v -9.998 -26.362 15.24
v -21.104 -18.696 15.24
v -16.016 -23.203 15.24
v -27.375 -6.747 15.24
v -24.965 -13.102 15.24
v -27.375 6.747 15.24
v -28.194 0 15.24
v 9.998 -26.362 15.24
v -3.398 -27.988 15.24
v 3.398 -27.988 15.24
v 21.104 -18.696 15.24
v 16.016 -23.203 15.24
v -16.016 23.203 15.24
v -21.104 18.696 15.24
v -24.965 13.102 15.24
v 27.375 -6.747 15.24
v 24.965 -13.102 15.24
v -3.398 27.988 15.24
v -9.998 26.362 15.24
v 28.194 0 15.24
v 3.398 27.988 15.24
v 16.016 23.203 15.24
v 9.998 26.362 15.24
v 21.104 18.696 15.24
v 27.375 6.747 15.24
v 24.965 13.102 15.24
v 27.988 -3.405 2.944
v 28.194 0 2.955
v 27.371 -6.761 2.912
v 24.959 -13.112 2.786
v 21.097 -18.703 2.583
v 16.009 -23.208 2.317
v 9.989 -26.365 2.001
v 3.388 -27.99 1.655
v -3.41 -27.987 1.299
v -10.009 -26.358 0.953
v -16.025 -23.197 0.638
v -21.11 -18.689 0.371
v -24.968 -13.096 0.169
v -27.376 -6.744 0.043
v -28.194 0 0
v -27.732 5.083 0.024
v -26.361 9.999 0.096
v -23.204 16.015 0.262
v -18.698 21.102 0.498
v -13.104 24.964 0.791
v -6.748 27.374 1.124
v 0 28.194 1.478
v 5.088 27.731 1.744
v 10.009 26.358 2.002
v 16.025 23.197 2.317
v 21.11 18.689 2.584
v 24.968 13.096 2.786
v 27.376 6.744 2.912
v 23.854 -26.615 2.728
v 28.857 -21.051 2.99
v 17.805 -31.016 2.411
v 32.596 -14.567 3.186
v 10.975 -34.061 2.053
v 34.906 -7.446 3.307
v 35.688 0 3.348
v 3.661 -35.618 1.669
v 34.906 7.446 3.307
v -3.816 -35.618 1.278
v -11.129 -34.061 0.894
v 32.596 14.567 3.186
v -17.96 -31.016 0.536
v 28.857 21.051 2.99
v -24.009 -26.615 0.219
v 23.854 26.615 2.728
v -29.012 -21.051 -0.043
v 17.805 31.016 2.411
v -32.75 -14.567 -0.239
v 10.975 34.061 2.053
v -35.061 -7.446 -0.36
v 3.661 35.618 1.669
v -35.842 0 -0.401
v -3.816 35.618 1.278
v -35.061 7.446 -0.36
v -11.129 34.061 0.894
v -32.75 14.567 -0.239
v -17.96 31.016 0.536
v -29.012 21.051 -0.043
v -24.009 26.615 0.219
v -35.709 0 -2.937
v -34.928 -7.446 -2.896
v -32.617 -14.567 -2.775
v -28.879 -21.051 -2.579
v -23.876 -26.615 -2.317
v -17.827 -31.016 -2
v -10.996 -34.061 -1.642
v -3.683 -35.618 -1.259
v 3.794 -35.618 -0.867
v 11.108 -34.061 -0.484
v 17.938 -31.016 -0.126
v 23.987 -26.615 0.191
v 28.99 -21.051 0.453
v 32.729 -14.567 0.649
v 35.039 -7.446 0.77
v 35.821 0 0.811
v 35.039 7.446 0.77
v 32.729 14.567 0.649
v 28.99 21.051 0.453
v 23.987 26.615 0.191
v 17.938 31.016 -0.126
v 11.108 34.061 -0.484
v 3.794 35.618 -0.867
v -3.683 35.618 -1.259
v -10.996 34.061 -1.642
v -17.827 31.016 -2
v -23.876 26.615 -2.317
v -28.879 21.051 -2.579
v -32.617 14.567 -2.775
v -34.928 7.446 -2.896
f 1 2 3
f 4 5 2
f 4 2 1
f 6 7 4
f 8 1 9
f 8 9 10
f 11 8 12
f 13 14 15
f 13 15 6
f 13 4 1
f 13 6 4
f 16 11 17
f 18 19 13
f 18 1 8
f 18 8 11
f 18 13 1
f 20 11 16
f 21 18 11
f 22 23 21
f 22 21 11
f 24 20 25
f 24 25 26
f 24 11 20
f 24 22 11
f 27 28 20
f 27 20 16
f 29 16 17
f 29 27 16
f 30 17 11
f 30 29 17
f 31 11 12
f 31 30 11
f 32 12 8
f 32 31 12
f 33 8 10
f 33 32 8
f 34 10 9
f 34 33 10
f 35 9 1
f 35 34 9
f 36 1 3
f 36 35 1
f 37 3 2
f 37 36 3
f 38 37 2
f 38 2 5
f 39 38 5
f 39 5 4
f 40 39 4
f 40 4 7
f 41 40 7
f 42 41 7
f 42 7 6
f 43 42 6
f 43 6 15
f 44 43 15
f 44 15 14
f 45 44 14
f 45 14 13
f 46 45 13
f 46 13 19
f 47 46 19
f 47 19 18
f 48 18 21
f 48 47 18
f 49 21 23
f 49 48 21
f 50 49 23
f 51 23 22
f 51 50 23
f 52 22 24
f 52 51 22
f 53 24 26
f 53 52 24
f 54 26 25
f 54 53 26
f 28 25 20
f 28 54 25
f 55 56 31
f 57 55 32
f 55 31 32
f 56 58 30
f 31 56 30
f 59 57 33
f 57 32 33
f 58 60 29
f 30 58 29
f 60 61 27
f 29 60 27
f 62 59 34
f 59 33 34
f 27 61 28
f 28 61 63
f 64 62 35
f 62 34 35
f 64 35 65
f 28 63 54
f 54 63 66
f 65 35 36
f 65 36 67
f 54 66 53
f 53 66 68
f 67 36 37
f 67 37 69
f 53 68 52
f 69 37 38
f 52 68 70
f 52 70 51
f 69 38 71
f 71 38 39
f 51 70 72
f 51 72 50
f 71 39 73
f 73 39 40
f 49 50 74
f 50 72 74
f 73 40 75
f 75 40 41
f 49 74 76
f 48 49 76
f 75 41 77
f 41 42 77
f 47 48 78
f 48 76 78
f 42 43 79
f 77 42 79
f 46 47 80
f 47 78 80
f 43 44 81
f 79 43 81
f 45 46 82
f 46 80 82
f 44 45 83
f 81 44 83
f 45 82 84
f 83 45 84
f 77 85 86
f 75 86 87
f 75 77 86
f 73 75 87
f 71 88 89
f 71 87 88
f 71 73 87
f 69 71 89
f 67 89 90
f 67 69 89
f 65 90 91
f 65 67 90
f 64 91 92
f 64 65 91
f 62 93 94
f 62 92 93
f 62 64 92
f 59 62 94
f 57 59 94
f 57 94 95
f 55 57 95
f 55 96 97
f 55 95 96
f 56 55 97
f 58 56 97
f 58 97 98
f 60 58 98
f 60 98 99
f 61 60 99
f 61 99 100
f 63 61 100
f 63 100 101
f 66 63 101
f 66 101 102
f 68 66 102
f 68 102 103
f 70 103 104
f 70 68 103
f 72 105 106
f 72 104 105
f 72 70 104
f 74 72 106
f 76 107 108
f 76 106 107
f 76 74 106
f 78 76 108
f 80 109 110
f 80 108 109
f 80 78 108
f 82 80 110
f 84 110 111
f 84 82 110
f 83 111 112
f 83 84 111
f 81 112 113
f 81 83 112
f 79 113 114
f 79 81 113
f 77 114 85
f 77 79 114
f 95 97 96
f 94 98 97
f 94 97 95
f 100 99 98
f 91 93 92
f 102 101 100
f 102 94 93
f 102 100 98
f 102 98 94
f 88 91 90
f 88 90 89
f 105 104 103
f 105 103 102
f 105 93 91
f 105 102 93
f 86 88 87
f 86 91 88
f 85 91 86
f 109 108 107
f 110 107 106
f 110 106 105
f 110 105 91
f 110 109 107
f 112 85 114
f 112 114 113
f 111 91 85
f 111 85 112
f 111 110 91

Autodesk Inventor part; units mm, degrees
ref_plane "YZ Plane" through (0, 0, 0) normal (1, 0, 0) x (0, 1, 0)
ref_plane "XZ Plane" through (0, 0, 0) normal (0, 1, 0) x (-1, 0, 0)
ref_plane "XY Plane" through (0, 0, 0) normal (0, 0, 1) x (1, 0, 0)
sketch "Sketch1" plane through (0, 0, 0) normal (0, 0, 1) x (1, 0, 0)
  circle A0 centre (0, 0) radius 28.194
  dimension "d0" = 56.388
extrude "Extrusion1" add sketch "Sketch1" along normal blind 15.24
sketch "Sketch2" plane through (0, 0, 15.24) normal (0, 0, 1) x (1, 0, 0)
  circle A0 centre (0, 0) radius 28.194 projected
  line L0 (0, 28.194) -> (19.1738, 28.194) construction
ref_plane "Work Plane1" through (0, 28.194, 15.24) normal (0, -1, 0) x (1, 0, 0)
sketch "Sketch3" plane through (0, 28.194, 15.24) normal (0, -1, 0) x (1, 0, 0)
  line L0 (-28.194, -15.24) -> (28.194, -15.24) projected
  line L1 (-28.194, -15.24) -> (37.5113, -11.7965)
  line L2 (-28.194, -15.24) -> (37.6014, -15.24) construction
  line L3 (37.5113, -11.7965) -> (37.5113, -25.6929)
  line L4 (37.5113, -25.6929) -> (-28.194, -15.24)
  point P0 (0, -15.24)
  dimension "d3" = 3
extrude "Extrusion2" cut sketch "Sketch3" along normal blind 152.4
sketch "Sketch4" plane through (0, 0, 1.4776) normal (0.052336, 0, -0.9986295) x (-0.9986295, 0, -0.052336)
  circle A0 centre (0.0773, 0) radius 35.814
  dimension "d6" = 71.628
extrude "Extrusion3" add sketch "Sketch4" along normal blind 2.54
properties part number "coilpiece2"
